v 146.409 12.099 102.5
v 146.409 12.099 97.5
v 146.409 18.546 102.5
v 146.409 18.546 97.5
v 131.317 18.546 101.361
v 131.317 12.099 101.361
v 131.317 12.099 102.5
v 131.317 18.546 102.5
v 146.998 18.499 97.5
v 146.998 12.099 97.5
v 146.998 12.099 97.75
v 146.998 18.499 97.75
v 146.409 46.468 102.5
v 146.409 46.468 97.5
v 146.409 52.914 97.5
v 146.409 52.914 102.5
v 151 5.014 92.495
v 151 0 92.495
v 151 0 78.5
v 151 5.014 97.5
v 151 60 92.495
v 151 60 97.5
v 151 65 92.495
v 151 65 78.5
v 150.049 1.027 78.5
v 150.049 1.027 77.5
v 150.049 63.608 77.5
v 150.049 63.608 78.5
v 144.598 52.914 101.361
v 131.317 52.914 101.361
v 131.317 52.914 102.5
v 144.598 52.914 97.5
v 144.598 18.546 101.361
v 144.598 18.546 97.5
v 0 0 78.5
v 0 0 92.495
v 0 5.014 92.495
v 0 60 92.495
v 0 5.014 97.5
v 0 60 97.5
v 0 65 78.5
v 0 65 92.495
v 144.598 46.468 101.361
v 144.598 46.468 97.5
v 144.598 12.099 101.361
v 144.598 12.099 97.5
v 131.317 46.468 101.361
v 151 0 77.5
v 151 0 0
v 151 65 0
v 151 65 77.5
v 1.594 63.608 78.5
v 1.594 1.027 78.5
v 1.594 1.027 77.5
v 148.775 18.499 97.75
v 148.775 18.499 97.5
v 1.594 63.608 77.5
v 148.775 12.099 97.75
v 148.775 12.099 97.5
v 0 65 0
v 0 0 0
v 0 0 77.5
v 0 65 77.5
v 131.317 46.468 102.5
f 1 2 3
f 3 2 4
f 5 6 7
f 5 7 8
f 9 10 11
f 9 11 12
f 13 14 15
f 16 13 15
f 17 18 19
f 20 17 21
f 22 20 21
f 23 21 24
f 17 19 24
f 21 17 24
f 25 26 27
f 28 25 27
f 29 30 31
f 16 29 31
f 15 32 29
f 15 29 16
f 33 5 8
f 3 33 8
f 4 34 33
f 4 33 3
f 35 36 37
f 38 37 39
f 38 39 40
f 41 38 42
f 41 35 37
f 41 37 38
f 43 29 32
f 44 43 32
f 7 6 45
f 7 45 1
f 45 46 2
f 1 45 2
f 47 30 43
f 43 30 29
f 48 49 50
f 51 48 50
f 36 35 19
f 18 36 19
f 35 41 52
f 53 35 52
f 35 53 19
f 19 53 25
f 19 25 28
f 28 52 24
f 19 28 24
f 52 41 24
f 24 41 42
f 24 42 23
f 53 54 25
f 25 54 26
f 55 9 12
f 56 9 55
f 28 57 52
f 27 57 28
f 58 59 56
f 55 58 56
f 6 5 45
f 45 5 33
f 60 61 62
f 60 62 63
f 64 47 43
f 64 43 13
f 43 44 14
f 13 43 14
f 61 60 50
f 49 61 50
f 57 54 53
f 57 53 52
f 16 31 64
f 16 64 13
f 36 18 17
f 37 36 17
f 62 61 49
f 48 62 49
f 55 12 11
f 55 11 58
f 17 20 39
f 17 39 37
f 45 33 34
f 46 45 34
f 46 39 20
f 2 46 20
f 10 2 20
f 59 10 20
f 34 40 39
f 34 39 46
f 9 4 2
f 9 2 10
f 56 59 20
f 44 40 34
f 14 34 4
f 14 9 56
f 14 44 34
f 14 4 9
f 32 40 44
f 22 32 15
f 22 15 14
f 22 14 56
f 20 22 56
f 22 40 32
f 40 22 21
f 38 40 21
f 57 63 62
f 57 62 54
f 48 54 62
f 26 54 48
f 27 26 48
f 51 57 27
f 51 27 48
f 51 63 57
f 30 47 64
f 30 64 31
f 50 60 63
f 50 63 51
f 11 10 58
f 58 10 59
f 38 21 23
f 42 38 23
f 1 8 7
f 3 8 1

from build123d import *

# Parameters (mm, degrees)
ESQUISSE1_W             = 151
ESQUISSE1_H             = 65
BOSS_EXTRU_1_DEPTH      = 77.5
ESQUISSE3_W             = 148.454907539
ESQUISSE3_H             = 62.58067557
BOSS_EXTRU_4_DEPTH      = 1
ESQUISSE4_W             = 151
ESQUISSE4_H             = 65
BOSS_EXTRU_5_DEPTH      = 19
ESQUISSE5_W             = 5.004872729
ESQUISSE5_H             = 5.013872644
ESQUISSE5_H_2           = 5.00047463
ENL_V_MAT_EXTRU_1_DEPTH = 159
ESQUISSE6_W             = 15.091858935
ESQUISSE6_H             = 6.446271405
BOSS_EXTRU_6_DEPTH      = 5
ESQUISSE7_W             = 13.28107707
ESQUISSE7_H             = 3.860939677
ENL_V_MAT_EXTRU_2_DEPTH = 45
ESQUISSE8_W             = 1.776428529
ESQUISSE8_H             = 6.399764331
BOSS_EXTRU_7_DEPTH      = 0.25


with BuildPart() as part:
    # Esquisse1 → Boss.-Extru.1 (new body)
    with BuildSketch(Plane.XY):
        with Locations((75.5, 32.5)):
            Rectangle(ESQUISSE1_W, ESQUISSE1_H)
    extrude(amount=BOSS_EXTRU_1_DEPTH)

    # Esquisse3 → Boss.-Extru.4 (add)
    with BuildSketch(Plane.XY.offset(77.5)):
        with Locations((75.821779061, 32.317365634)):
            Rectangle(ESQUISSE3_W, ESQUISSE3_H)
    extrude(amount=BOSS_EXTRU_4_DEPTH)

    # Esquisse4 → Boss.-Extru.5 (add)
    with BuildSketch(Plane.XY.offset(78.5)):
        with Locations((75.5, 32.5)):
            Rectangle(ESQUISSE4_W, ESQUISSE4_H)
    extrude(amount=BOSS_EXTRU_5_DEPTH)

    # Esquisse5 → Enlèv. mat.-Extru.1 (cut)
    with BuildSketch(Plane(origin=(151, 0, 0), x_dir=(0, 0, -1), z_dir=(1, 0, 0))):
        with Locations((-94.997563636, 2.506936322)):
            Rectangle(ESQUISSE5_W, ESQUISSE5_H)
        with Locations((-94.997563636, 62.499762685)):
            Rectangle(ESQUISSE5_W, ESQUISSE5_H_2)
    extrude(amount=-ENL_V_MAT_EXTRU_1_DEPTH, mode=Mode.SUBTRACT)

    # Esquisse6 → Boss.-Extru.6 (add)
    with BuildSketch(Plane.XY.offset(97.5)):
        with Locations((138.863055981, 49.690815345)):
            Rectangle(ESQUISSE6_W, ESQUISSE6_H)
        with Locations((138.863055981, 15.32258267)):
            Rectangle(ESQUISSE6_W, ESQUISSE6_H)
    extrude(amount=BOSS_EXTRU_6_DEPTH)

    # Esquisse7 → Enlèv. mat.-Extru.2 (cut)
    with BuildSketch(Plane(origin=(0, 52.913951047, 0), x_dir=(1, 0, 0), z_dir=(0, 1, 0))):
        with Locations((137.957665049, -99.430469839)):
            Rectangle(ESQUISSE7_W, ESQUISSE7_H)
    extrude(amount=-ENL_V_MAT_EXTRU_2_DEPTH, mode=Mode.SUBTRACT)

    # Esquisse8 → Boss.-Extru.7 (add)
    with BuildSketch(Plane.XY.offset(97.5)):
        with Locations((147.886510026, 15.299329133)):
            Rectangle(ESQUISSE8_W, ESQUISSE8_H)
    extrude(amount=BOSS_EXTRU_7_DEPTH)


solid = part.part
